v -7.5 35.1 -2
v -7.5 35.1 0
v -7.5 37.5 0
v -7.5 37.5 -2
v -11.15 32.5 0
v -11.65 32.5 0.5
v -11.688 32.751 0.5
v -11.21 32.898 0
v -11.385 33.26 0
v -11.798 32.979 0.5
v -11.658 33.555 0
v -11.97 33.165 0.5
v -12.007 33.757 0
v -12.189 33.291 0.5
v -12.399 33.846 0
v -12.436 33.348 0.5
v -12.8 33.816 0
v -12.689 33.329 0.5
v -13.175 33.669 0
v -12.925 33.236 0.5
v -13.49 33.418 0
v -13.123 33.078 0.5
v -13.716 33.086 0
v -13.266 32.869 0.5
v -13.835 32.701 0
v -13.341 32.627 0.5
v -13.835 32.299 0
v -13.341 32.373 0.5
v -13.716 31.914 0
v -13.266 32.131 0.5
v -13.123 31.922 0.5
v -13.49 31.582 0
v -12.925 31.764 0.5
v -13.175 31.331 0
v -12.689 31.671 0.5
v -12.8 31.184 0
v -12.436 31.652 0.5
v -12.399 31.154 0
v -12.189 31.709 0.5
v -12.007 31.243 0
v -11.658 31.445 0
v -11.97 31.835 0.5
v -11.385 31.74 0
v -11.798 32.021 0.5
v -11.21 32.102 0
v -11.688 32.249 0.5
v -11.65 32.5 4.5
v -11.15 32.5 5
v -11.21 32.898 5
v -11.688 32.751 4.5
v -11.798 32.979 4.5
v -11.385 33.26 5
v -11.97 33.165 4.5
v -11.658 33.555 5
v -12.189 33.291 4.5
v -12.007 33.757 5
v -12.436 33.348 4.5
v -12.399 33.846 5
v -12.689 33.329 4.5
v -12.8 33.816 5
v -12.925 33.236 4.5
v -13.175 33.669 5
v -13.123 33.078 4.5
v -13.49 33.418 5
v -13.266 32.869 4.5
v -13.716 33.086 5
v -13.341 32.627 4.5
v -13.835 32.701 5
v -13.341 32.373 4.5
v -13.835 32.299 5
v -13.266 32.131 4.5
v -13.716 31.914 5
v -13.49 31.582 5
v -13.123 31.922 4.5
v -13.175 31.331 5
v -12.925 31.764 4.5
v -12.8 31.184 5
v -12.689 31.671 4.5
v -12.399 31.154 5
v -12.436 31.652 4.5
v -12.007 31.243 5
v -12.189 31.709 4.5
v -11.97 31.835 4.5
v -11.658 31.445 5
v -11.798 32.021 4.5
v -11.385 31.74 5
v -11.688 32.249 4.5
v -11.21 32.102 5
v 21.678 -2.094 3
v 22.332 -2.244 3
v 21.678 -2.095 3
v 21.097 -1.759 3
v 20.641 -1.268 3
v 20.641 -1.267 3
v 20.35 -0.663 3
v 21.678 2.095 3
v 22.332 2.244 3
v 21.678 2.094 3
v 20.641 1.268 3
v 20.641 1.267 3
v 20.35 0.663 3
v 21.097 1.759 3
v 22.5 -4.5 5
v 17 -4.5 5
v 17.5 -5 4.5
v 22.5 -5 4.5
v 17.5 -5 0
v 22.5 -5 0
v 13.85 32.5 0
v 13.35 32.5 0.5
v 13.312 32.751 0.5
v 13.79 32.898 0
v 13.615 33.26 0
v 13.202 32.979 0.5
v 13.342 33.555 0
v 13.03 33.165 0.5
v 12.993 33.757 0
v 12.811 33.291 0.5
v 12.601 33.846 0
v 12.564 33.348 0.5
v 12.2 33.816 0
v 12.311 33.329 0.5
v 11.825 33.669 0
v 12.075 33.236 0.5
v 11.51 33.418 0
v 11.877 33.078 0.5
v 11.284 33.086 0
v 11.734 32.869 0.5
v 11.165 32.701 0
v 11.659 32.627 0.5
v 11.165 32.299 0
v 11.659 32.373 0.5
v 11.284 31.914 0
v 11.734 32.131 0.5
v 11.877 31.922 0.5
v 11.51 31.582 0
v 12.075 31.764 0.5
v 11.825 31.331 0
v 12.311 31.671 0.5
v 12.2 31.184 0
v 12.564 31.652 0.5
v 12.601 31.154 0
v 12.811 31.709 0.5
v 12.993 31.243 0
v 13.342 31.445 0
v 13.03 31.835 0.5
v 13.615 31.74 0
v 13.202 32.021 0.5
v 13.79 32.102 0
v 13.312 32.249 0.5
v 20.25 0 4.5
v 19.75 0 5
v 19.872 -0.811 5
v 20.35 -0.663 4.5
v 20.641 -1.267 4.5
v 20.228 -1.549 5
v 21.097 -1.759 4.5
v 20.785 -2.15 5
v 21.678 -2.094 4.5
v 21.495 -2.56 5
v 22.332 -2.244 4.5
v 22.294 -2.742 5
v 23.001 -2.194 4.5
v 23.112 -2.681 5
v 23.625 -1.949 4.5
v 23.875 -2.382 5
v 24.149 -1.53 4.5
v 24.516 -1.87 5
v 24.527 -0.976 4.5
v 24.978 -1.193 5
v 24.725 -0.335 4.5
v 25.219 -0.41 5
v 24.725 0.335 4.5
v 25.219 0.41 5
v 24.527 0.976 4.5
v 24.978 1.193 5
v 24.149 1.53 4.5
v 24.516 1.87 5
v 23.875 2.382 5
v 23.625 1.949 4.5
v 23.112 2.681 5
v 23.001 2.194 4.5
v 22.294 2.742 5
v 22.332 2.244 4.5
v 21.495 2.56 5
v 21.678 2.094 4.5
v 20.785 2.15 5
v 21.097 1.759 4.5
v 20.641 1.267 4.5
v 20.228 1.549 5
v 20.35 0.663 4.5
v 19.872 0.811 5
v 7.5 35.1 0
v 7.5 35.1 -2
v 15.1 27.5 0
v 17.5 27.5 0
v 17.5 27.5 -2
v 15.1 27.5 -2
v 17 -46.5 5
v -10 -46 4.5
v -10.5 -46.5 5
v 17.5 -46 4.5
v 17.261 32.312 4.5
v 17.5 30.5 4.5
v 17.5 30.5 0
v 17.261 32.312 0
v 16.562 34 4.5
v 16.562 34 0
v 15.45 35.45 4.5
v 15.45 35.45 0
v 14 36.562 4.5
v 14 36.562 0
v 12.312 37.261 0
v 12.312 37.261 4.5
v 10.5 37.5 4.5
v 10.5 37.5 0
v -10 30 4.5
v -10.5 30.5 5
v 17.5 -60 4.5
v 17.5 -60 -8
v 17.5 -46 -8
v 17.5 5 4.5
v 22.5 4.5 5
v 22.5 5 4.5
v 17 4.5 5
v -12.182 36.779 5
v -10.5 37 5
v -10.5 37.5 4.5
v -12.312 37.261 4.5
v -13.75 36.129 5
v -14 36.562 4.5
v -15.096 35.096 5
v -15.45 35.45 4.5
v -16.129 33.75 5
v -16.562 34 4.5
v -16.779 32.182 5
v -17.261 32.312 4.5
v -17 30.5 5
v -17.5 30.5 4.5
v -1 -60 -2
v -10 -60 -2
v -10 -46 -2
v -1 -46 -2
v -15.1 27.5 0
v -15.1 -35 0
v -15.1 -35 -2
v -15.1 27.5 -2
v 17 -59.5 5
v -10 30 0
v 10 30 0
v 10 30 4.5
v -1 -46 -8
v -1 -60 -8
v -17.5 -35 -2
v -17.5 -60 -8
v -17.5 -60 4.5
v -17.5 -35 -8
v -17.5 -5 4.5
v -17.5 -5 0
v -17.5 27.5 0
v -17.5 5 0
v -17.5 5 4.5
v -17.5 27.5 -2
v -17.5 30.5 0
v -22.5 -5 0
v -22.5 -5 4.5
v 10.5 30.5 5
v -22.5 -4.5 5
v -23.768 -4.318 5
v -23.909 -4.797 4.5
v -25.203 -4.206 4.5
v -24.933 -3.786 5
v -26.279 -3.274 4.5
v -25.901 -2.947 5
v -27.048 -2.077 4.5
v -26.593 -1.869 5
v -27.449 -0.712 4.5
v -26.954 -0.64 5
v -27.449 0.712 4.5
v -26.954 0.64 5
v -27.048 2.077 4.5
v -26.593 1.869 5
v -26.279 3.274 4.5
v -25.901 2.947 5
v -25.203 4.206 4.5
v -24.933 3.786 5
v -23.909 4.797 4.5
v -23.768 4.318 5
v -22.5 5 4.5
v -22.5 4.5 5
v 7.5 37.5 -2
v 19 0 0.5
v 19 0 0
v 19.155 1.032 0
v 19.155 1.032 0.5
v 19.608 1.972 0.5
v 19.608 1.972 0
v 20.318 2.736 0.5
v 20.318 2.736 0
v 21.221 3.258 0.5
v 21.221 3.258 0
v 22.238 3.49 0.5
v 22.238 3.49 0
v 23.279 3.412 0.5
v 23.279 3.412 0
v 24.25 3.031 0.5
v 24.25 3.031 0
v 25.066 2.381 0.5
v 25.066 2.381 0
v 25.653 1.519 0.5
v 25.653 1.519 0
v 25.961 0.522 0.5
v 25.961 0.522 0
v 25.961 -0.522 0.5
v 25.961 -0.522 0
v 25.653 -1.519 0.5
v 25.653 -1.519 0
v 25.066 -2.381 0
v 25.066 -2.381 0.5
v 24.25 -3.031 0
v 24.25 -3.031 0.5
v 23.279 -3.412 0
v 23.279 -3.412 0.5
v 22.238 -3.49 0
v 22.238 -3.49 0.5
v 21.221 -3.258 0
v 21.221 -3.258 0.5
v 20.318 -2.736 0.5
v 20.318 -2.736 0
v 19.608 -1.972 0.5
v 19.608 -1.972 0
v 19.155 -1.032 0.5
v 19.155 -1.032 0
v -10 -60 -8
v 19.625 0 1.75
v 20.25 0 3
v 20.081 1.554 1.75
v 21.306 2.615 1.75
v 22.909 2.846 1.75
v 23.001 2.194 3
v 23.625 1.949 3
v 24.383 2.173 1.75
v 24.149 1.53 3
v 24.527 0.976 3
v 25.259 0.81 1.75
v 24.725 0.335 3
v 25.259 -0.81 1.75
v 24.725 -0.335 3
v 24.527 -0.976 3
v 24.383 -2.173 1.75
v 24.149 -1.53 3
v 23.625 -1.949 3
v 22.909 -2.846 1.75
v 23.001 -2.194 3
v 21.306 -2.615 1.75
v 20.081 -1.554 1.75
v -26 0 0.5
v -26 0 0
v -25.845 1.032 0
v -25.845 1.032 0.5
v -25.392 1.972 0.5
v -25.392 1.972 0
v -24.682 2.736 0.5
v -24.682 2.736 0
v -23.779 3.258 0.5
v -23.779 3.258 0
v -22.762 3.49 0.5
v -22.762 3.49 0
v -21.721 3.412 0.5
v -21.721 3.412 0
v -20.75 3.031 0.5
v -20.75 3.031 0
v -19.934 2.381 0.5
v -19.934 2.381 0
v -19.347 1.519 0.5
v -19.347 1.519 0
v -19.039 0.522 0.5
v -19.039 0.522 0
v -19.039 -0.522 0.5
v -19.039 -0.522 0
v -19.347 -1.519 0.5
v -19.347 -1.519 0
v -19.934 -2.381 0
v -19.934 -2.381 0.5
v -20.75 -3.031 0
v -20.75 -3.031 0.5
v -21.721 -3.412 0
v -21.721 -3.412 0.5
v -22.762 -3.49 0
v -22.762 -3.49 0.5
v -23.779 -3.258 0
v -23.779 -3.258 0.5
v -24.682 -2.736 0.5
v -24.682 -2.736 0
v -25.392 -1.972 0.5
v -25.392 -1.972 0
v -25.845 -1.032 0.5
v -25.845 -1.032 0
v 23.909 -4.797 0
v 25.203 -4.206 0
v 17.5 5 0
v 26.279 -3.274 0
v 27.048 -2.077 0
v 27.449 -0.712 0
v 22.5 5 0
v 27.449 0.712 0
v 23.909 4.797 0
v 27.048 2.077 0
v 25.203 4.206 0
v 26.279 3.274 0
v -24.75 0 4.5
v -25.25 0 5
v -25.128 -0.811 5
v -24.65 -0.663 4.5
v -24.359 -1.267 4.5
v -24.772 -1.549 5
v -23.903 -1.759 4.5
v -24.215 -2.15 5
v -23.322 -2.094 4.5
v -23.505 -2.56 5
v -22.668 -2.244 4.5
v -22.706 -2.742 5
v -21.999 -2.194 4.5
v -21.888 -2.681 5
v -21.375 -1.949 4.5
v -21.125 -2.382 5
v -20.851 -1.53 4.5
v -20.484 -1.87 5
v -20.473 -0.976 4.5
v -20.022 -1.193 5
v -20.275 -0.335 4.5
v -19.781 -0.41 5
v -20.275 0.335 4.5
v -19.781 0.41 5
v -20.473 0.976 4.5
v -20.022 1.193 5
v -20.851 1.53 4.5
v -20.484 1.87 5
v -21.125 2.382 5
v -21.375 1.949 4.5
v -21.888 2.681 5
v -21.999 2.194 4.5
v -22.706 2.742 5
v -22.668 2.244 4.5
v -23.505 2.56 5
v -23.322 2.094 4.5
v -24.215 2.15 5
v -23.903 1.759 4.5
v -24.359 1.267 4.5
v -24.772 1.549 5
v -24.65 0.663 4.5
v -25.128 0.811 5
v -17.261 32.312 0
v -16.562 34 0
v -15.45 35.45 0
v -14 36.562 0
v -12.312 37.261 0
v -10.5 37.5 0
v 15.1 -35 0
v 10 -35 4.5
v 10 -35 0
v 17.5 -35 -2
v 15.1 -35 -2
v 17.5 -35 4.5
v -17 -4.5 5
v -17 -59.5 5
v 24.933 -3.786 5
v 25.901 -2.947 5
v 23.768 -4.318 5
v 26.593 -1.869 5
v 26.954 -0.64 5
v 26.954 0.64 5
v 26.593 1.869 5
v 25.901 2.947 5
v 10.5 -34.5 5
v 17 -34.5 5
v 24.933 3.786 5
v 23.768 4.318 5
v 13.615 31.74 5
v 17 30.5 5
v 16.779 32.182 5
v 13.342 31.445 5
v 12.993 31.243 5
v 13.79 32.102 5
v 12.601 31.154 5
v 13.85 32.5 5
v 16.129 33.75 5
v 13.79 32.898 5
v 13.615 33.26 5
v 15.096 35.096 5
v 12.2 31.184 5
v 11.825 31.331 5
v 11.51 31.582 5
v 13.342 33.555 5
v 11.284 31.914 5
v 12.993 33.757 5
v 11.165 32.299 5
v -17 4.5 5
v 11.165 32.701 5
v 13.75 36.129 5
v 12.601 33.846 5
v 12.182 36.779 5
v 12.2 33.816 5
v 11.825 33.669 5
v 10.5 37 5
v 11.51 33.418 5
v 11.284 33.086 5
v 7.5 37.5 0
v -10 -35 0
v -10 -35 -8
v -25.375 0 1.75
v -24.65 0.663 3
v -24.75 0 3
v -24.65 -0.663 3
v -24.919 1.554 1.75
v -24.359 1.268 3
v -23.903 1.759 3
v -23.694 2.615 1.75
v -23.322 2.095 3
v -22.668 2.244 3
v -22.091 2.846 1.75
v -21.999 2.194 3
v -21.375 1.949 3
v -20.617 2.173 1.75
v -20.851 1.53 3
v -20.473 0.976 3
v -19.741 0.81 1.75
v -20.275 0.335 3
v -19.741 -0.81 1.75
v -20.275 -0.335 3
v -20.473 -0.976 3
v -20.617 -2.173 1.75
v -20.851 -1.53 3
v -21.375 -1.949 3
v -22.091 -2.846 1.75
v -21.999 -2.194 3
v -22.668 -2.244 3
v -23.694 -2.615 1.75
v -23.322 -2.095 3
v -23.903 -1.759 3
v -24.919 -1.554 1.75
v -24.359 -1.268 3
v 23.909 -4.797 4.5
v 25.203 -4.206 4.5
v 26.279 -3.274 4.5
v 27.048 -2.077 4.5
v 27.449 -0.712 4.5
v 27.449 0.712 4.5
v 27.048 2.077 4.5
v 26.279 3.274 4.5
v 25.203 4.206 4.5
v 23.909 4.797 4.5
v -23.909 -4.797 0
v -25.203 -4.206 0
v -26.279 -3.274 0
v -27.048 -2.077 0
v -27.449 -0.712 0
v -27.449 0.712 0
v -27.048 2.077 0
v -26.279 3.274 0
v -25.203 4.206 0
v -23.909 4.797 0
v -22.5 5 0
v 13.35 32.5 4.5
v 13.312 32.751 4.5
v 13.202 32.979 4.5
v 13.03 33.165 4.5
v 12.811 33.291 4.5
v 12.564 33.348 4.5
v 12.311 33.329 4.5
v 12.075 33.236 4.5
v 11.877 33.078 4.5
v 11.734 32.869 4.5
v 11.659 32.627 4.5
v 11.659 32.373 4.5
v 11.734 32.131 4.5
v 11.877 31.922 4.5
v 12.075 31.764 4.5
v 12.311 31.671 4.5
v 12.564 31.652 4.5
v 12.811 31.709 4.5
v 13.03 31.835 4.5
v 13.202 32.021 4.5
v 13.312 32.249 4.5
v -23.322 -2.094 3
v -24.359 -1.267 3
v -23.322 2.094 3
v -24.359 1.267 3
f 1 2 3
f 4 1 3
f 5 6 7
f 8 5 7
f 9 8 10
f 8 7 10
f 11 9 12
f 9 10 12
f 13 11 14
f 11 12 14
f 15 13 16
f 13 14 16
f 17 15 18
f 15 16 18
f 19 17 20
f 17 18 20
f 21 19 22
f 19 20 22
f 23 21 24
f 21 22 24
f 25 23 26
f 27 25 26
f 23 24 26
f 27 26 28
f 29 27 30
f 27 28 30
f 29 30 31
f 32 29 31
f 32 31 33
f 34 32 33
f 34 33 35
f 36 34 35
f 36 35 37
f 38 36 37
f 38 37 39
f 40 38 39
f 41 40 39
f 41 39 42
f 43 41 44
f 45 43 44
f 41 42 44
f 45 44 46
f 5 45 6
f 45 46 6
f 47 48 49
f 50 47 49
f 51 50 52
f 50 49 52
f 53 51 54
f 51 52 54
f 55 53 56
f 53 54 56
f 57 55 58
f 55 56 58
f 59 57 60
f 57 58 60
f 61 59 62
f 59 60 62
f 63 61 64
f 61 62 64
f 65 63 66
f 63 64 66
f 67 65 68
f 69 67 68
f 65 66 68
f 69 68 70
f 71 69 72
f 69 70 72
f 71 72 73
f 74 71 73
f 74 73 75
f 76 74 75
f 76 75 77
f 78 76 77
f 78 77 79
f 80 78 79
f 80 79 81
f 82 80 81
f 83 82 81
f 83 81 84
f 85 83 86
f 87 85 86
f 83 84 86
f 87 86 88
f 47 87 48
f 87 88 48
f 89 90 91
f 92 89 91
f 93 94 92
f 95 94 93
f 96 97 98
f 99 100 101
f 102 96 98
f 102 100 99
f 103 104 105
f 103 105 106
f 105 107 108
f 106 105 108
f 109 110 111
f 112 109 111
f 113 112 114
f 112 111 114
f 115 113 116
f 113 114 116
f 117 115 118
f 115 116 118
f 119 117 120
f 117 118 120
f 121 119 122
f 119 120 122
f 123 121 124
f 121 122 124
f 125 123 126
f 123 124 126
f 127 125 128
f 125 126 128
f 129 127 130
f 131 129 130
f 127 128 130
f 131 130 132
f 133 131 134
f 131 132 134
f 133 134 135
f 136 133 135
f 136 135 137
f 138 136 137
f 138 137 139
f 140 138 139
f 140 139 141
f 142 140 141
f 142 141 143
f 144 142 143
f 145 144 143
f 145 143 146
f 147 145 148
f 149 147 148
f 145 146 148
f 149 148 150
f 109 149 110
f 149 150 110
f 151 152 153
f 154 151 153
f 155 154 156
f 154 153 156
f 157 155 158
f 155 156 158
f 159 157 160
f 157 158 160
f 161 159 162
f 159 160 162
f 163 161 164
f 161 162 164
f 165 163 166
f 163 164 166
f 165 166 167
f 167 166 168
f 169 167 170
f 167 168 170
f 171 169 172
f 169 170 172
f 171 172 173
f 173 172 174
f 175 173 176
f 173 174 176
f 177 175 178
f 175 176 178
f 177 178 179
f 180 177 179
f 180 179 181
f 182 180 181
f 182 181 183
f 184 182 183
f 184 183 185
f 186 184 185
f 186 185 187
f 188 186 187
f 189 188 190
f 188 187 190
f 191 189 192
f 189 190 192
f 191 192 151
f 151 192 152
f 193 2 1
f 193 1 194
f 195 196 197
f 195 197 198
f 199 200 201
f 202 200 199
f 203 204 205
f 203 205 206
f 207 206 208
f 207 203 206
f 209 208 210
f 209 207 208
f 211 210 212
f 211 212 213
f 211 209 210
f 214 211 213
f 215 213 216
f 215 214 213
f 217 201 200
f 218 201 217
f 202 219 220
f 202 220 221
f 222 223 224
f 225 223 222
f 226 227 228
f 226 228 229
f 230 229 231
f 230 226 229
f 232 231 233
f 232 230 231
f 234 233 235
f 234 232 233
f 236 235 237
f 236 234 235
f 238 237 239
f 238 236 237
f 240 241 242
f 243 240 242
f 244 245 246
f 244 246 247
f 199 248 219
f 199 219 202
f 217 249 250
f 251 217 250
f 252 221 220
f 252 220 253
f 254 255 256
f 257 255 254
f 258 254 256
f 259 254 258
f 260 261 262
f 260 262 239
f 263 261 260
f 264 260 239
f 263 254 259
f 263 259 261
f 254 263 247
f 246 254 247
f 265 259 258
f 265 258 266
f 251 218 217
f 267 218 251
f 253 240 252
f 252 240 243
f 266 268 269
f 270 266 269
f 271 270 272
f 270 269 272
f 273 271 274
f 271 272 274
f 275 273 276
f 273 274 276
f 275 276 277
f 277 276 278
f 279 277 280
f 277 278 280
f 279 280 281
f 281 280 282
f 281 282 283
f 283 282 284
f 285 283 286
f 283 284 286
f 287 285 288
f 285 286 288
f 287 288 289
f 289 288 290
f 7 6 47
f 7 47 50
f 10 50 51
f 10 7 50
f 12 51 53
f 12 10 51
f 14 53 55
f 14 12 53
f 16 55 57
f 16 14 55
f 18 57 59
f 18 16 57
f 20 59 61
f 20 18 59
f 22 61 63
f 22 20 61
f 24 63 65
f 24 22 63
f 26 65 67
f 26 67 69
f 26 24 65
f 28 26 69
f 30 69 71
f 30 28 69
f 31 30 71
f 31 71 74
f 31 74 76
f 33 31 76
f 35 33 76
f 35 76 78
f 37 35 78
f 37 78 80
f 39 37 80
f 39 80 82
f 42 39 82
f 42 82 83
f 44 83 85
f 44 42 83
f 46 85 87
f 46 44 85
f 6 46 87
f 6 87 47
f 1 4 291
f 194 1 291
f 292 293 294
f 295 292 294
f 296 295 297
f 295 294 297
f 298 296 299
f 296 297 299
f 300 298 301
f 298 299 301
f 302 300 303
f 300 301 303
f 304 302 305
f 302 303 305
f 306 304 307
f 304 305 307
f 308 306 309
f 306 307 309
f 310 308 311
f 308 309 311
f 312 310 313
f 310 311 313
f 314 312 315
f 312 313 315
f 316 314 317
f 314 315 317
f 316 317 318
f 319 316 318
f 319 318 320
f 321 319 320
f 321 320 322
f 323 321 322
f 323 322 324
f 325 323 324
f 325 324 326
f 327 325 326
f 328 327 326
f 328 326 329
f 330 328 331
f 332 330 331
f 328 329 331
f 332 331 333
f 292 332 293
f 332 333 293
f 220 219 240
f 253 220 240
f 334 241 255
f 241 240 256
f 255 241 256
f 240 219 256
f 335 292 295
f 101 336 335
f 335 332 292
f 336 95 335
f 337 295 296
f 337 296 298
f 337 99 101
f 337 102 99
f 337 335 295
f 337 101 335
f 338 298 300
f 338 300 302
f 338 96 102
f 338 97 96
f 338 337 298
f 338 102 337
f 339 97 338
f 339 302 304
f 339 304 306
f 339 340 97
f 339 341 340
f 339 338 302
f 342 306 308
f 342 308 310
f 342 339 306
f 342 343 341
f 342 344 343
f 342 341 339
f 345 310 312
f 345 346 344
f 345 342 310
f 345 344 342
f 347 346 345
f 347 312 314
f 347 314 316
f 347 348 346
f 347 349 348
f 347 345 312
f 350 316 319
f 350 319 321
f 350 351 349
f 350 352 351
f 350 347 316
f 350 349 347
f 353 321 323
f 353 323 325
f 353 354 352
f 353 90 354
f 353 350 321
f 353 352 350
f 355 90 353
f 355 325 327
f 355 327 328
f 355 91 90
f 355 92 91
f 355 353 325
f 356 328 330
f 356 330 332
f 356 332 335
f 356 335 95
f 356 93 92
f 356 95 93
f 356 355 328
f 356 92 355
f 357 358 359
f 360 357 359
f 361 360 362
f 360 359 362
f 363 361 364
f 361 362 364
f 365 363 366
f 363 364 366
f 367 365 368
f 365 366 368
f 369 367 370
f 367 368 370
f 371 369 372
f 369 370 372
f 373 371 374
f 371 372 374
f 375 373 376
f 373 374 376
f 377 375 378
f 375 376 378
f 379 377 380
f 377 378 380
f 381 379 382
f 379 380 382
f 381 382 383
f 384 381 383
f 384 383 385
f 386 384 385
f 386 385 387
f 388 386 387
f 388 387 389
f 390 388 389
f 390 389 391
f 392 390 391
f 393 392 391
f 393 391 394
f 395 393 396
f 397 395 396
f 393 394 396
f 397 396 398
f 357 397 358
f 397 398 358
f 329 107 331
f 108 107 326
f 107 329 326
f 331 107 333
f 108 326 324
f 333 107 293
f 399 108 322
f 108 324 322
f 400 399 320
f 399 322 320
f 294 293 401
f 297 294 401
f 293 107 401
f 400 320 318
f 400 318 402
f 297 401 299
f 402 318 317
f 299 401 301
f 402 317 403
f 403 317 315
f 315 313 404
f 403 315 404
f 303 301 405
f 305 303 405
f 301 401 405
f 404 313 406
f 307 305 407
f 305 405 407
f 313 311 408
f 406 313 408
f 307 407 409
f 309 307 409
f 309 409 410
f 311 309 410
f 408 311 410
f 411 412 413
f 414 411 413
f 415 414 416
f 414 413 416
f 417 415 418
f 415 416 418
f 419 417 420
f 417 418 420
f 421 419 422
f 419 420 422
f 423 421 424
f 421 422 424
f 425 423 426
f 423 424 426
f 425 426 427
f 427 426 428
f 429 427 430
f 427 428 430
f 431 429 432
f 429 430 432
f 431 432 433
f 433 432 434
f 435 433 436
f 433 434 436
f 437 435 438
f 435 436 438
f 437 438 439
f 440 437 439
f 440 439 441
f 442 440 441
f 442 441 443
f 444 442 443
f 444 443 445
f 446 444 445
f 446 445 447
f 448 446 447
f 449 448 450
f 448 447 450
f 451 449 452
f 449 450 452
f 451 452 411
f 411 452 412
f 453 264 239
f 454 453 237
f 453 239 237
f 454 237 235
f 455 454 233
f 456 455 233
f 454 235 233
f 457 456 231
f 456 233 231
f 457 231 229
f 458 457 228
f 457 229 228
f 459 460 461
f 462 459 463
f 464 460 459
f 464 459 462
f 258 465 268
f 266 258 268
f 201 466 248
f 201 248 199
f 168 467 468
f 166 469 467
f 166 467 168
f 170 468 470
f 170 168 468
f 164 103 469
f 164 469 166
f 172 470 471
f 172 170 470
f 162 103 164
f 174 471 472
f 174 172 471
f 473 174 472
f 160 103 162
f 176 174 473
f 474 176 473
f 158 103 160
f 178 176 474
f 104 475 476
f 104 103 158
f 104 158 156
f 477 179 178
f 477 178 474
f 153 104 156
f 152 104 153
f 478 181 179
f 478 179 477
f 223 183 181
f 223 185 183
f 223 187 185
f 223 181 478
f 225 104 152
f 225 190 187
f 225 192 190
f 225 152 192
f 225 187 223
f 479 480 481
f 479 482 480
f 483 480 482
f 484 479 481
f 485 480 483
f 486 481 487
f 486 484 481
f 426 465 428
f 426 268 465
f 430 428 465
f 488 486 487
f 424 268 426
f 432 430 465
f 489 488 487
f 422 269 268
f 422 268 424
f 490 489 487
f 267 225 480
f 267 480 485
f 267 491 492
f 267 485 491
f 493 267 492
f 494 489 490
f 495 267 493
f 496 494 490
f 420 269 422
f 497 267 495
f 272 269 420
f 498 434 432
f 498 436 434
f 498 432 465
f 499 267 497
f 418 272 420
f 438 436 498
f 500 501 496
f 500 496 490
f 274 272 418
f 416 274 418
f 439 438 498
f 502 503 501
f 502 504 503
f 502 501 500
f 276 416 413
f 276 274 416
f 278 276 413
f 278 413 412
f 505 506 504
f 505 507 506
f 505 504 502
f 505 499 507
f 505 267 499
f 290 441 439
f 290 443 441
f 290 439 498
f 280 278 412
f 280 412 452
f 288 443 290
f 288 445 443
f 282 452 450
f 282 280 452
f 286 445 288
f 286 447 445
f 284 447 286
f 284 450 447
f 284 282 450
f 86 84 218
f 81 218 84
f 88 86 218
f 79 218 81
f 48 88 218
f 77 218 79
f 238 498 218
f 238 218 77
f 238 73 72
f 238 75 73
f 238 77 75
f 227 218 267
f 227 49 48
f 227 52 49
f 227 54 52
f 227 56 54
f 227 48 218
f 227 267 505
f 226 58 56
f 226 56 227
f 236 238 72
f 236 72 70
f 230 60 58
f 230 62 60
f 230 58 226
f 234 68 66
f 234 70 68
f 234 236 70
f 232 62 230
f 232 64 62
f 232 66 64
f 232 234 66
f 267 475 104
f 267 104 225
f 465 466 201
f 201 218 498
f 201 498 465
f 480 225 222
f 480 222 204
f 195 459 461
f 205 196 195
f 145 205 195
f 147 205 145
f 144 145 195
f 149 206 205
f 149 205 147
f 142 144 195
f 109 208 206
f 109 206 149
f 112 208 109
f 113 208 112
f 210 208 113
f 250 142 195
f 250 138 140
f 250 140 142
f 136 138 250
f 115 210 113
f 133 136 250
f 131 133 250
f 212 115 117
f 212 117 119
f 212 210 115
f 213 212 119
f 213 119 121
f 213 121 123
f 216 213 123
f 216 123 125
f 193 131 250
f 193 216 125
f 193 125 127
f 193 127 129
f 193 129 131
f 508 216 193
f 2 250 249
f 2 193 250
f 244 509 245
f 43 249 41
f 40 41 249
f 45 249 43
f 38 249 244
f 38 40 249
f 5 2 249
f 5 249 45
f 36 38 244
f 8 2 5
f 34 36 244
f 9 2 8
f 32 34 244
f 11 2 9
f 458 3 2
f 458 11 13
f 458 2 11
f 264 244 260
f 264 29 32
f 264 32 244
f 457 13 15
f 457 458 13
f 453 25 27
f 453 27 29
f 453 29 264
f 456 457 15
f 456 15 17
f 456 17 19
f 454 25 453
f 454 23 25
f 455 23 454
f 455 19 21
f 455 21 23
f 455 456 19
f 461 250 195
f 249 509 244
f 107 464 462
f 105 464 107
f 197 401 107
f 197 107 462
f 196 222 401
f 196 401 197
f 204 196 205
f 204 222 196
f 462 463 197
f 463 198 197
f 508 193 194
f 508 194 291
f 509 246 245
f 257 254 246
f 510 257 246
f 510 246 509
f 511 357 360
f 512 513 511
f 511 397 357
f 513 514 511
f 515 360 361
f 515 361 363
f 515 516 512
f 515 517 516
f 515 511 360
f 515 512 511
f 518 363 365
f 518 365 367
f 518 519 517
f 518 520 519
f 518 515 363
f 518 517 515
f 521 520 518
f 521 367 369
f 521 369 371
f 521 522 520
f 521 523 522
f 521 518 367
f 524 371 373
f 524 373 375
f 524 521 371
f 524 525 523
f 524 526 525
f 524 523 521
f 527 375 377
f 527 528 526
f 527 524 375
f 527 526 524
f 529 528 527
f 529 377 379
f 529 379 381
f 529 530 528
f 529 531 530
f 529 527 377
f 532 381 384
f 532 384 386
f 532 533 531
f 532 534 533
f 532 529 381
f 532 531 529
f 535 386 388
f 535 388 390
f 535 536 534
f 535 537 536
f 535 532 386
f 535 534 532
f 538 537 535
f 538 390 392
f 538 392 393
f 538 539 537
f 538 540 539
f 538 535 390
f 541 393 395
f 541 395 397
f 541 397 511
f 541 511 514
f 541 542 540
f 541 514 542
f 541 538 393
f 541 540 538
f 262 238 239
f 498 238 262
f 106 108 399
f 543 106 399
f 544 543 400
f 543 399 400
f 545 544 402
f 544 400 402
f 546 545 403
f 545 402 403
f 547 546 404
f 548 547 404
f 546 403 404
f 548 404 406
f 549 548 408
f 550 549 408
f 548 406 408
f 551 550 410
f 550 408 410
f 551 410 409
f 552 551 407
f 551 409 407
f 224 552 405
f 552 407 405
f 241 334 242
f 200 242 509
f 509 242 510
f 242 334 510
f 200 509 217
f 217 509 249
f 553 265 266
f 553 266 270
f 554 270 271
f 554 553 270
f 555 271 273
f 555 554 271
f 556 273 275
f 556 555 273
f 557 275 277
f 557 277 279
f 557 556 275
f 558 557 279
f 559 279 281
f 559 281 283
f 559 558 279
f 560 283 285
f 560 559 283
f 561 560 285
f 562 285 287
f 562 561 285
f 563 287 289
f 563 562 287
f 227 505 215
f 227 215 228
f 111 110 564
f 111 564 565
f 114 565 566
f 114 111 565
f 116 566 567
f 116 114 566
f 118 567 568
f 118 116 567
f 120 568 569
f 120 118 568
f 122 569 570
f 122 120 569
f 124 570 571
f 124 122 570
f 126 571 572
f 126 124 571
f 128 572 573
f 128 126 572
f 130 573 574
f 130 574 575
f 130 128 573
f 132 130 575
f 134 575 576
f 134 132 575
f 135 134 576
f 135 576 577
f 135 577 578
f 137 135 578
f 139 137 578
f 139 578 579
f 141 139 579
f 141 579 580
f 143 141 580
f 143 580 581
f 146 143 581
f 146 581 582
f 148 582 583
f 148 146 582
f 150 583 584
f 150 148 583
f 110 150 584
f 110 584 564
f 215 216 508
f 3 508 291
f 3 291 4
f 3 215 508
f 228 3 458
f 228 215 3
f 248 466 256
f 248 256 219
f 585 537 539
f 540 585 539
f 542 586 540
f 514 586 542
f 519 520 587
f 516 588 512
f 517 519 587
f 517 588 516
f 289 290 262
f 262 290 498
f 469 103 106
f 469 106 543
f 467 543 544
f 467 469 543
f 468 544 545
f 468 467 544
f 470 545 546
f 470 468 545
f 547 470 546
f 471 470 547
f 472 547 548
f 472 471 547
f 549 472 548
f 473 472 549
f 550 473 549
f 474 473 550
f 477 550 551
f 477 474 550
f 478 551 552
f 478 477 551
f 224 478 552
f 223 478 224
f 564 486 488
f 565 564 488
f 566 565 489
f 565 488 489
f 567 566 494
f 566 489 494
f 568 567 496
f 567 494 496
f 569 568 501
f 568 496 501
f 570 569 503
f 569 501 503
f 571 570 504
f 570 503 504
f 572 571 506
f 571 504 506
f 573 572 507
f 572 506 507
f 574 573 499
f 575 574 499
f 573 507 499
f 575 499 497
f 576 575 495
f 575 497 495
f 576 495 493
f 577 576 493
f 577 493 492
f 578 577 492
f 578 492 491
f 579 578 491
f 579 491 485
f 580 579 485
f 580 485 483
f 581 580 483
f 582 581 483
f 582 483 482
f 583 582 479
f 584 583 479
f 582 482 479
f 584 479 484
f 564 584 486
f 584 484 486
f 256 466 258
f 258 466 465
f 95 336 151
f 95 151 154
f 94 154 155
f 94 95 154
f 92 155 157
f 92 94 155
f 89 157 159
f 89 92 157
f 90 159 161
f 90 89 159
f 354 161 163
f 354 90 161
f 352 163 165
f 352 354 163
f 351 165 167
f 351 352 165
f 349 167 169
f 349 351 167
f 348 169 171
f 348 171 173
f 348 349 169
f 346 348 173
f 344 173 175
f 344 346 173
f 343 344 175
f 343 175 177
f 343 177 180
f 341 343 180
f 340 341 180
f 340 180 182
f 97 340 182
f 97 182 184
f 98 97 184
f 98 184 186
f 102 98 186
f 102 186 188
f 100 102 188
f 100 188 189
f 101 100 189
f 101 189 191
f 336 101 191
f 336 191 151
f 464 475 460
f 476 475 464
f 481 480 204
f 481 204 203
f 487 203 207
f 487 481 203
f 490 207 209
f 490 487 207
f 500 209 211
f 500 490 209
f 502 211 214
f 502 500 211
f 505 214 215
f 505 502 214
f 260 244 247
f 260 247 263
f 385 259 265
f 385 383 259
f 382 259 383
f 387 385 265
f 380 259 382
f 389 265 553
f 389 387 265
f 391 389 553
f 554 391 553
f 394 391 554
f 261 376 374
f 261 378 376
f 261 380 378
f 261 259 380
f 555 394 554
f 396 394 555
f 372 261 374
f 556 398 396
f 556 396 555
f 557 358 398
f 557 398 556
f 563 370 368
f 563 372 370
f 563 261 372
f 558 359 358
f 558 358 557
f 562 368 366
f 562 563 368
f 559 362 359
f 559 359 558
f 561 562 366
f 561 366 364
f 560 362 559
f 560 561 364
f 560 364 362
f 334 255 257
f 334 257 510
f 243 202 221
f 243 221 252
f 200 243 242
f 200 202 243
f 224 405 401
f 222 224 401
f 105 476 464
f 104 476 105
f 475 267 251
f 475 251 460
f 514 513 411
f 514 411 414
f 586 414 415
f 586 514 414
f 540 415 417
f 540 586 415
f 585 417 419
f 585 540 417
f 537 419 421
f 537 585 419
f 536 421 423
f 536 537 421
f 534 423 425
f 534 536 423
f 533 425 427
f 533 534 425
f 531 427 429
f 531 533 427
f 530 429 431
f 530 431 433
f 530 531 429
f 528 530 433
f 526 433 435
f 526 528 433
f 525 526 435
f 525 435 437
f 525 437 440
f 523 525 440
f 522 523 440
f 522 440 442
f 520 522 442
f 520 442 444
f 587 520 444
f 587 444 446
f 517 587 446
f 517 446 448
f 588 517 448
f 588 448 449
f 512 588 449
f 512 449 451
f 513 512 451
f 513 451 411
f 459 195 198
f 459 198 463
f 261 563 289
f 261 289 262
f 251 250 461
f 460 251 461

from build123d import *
from OCP.BRepFilletAPI import BRepFilletAPI_MakeChamfer

# Parameters (mm, degrees)
SKETCH1_R                = 0.85
BOSS_EXTRUDE1_DEPTH      = 5
BOSS_EXTRUDE2_DEPTH      = 2
SKETCH3_R                = 2.25
BOSS_EXTRUDE3_DEPTH      = 5
SKETCH4_R                = 3.5
CUT_EXTRUDE1_DEPTH       = 3
SKETCH5_W                = 10
SKETCH5_H                = 10
CUT_EXTRUDE2_DEPTH       = 47.770717335
FILLET1_R                = 7
BOSS_EXTRUDE4_DEPTH      = 5
BOSS_EXTRUDE4_DEPTH_BACK = 8
SKETCH6_W                = 7.5
SKETCH6_H                = 25
SKETCH7_W                = 7
SKETCH7_H                = 14
BOSS_EXTRUDE5_DEPTH      = 27.5
SKETCH8_W                = 18.5
SKETCH8_H                = 14
BOSS_EXTRUDE6_DEPTH      = 6
CHAMFER3_SIZE            = 0.5
CHAMFER1_SIZE            = 2.5
CHAMFER1_SIZE_2          = 1.25


with BuildPart() as part:
    # Sketch1 → Boss-Extrude1 (new body)
    with BuildSketch(Plane.XY):
        Polygon((-10, -35), (-10, 30), (10, 30), (10, -35), (17.5, -35), (17.5, 37.5), (-17.5, 37.5), (-17.5, -35), align=None)
        with Locations((-12.5, 32.5)):
            Circle(SKETCH1_R, mode=Mode.SUBTRACT)
        with Locations((12.5, 32.5)):
            Circle(SKETCH1_R, mode=Mode.SUBTRACT)
    extrude(amount=BOSS_EXTRUDE1_DEPTH)

    # Sketch2 → Boss-Extrude2 (add)
    with BuildSketch(Plane.XY):
        Polygon((17.5, -35), (17.5, 37.5), (-17.5, 37.5), (-17.5, -35), (-15.1, -35), (-15.1, 35.1), (15.1, 35.1), (15.1, -35), align=None)
    extrude(amount=-BOSS_EXTRUDE2_DEPTH)

    # Sketch3 → Boss-Extrude3 (add)
    # profile 1 of 2: a face of its own
    with BuildSketch(Plane.XY):
        with BuildLine():
            Line((22.5, 5), (17.5, 5))
            Line((17.5, 5), (17.5, -5))
            Line((17.5, -5), (22.5, -5))
            ThreePointArc((22.5, -5), (27.5, 0), (22.5, 5))
        make_face()
        with Locations(Location((22.5, 0, 0), (0, 0, 180))):
            Circle(SKETCH3_R, mode=Mode.SUBTRACT)
    # profile 2 of 2: a face of its own
    with BuildSketch(Plane.XY):
        with BuildLine():
            Line((-22.5, 5), (-17.5, 5))
            Line((-17.5, 5), (-17.5, -5))
            Line((-17.5, -5), (-22.5, -5))
            ThreePointArc((-22.5, -5), (-27.5, 0), (-22.5, 5))
        make_face()
        with Locations(Location((-22.5, 0, 0), (0, 0, 180))):
            Circle(SKETCH3_R, mode=Mode.SUBTRACT)
    extrude(amount=BOSS_EXTRUDE3_DEPTH)

    # Sketch4 → Cut-Extrude1 (cut)
    with BuildSketch(Plane(origin=(0, 0, 0), x_dir=(-1, 0, 0), z_dir=(0, 0, -1))):
        with Locations((-22.5, 0)):
            Circle(SKETCH4_R)
        with Locations((22.5, 0)):
            Circle(SKETCH4_R)
    extrude(amount=-CUT_EXTRUDE1_DEPTH, mode=Mode.SUBTRACT)

    # Sketch5 → Cut-Extrude2 (cut, through all)
    with BuildSketch(Plane(origin=(0, 0, 0), x_dir=(-1, 0, 0), z_dir=(0, 0, -1))):
        with Locations((-12.5, 32.5)):
            Rectangle(SKETCH5_W, SKETCH5_H)
        with Locations((12.5, 32.5)):
            Rectangle(SKETCH5_W, SKETCH5_H)
    extrude(amount=CUT_EXTRUDE2_DEPTH, mode=Mode.SUBTRACT)

    # Fillet1
    fillet1_edges = [part.edges().sort_by_distance(p)[0] for p in [
        (-17.5, 37.5, 2.5),
        (17.5, 37.5, 2.5),
    ]]
    fillet(fillet1_edges, radius=FILLET1_R)

    # Sketch6 → Boss-Extrude4 (add, two sides: drawn at the far end of the back side and taken through both)
    with BuildSketch(Plane.XY.offset(-BOSS_EXTRUDE4_DEPTH_BACK)):
        with Locations((-13.75, -47.5)):
            Rectangle(SKETCH6_W, SKETCH6_H)
    extrude(amount=BOSS_EXTRUDE4_DEPTH + BOSS_EXTRUDE4_DEPTH_BACK)

    # Sketch7 → Boss-Extrude5 (add)
    with BuildSketch(Plane(origin=(-10, 0, 0), x_dir=(0, 0, -1), z_dir=(1, 0, 0))):
        with Locations((-1.5, -53)):
            Rectangle(SKETCH7_W, SKETCH7_H)
    extrude(amount=BOSS_EXTRUDE5_DEPTH)

    # Sketch8 → Boss-Extrude6 (add)
    with BuildSketch(Plane(origin=(0, 0, -2), x_dir=(-1, 0, 0), z_dir=(0, 0, -1))):
        with Locations((-8.25, -53)):
            Rectangle(SKETCH8_W, SKETCH8_H)
    extrude(amount=BOSS_EXTRUDE6_DEPTH)

    # Chamfer3
    chamfer3_edges = [part.edges().sort_by_distance(p)[0] for p in [
        (0, 30, 5),
        (-17.5, -32.5, 5),
        (0, 37.5, 5),
        (15.449747468, 35.449747468, 5),
        (-15.449747468, 35.449747468, 5),
        (0, -60, 5),
        (10, -2.5, 5),
        (-10, -8, 5),
        (17.5, -53, 5),
        (3.75, -46, 5),
        (13.75, -35, 5),
        (-13.35, 32.5, 0),
        (-13.35, 32.5, 5),
        (17.5, -20, 5),
        (11.65, 32.5, 0),
        (11.65, 32.5, 5),
        (27.5, 0, 5),
        (20, 5, 5),
        (20, -5, 5),
        (24.75, 0, 5),
        (-27.5, 0, 5),
        (-20, -5, 5),
        (-20, 5, 5),
        (-20.25, 0, 5),
    ]]
    chamfer(chamfer3_edges, length=CHAMFER3_SIZE)

    # Chamfer1
    chamfer1_edges_1 = [part.edges().sort_by_distance(p)[0] for p in [
        (26, 0, 3),
    ]]
    chamfer1_side_1 = [part.faces().sort_by_distance(p)[0] for p in [
        (26, 0, 2.975),
    ]]
    chamfer1_edges_2 = [part.edges().sort_by_distance(p)[0] for p in [
        (-19, 0, 3),
    ]]
    chamfer1_side_2 = [part.faces().sort_by_distance(p)[0] for p in [
        (-19, 0, 2.975),
    ]]
    chamfer1 = BRepFilletAPI_MakeChamfer(part.part.solid().wrapped)
    for e in chamfer1_edges_1:
        chamfer1.Add(CHAMFER1_SIZE - 0.0001, CHAMFER1_SIZE_2 - 0.0001, e.wrapped, chamfer1_side_1[0].wrapped)
    for e in chamfer1_edges_2:
        chamfer1.Add(CHAMFER1_SIZE - 0.0001, CHAMFER1_SIZE_2 - 0.0001, e.wrapped, chamfer1_side_2[0].wrapped)
    add(Compound.cast(chamfer1.Shape()), mode=Mode.REPLACE)  # a hair under: the kernel refuses the full size


solid = part.part
